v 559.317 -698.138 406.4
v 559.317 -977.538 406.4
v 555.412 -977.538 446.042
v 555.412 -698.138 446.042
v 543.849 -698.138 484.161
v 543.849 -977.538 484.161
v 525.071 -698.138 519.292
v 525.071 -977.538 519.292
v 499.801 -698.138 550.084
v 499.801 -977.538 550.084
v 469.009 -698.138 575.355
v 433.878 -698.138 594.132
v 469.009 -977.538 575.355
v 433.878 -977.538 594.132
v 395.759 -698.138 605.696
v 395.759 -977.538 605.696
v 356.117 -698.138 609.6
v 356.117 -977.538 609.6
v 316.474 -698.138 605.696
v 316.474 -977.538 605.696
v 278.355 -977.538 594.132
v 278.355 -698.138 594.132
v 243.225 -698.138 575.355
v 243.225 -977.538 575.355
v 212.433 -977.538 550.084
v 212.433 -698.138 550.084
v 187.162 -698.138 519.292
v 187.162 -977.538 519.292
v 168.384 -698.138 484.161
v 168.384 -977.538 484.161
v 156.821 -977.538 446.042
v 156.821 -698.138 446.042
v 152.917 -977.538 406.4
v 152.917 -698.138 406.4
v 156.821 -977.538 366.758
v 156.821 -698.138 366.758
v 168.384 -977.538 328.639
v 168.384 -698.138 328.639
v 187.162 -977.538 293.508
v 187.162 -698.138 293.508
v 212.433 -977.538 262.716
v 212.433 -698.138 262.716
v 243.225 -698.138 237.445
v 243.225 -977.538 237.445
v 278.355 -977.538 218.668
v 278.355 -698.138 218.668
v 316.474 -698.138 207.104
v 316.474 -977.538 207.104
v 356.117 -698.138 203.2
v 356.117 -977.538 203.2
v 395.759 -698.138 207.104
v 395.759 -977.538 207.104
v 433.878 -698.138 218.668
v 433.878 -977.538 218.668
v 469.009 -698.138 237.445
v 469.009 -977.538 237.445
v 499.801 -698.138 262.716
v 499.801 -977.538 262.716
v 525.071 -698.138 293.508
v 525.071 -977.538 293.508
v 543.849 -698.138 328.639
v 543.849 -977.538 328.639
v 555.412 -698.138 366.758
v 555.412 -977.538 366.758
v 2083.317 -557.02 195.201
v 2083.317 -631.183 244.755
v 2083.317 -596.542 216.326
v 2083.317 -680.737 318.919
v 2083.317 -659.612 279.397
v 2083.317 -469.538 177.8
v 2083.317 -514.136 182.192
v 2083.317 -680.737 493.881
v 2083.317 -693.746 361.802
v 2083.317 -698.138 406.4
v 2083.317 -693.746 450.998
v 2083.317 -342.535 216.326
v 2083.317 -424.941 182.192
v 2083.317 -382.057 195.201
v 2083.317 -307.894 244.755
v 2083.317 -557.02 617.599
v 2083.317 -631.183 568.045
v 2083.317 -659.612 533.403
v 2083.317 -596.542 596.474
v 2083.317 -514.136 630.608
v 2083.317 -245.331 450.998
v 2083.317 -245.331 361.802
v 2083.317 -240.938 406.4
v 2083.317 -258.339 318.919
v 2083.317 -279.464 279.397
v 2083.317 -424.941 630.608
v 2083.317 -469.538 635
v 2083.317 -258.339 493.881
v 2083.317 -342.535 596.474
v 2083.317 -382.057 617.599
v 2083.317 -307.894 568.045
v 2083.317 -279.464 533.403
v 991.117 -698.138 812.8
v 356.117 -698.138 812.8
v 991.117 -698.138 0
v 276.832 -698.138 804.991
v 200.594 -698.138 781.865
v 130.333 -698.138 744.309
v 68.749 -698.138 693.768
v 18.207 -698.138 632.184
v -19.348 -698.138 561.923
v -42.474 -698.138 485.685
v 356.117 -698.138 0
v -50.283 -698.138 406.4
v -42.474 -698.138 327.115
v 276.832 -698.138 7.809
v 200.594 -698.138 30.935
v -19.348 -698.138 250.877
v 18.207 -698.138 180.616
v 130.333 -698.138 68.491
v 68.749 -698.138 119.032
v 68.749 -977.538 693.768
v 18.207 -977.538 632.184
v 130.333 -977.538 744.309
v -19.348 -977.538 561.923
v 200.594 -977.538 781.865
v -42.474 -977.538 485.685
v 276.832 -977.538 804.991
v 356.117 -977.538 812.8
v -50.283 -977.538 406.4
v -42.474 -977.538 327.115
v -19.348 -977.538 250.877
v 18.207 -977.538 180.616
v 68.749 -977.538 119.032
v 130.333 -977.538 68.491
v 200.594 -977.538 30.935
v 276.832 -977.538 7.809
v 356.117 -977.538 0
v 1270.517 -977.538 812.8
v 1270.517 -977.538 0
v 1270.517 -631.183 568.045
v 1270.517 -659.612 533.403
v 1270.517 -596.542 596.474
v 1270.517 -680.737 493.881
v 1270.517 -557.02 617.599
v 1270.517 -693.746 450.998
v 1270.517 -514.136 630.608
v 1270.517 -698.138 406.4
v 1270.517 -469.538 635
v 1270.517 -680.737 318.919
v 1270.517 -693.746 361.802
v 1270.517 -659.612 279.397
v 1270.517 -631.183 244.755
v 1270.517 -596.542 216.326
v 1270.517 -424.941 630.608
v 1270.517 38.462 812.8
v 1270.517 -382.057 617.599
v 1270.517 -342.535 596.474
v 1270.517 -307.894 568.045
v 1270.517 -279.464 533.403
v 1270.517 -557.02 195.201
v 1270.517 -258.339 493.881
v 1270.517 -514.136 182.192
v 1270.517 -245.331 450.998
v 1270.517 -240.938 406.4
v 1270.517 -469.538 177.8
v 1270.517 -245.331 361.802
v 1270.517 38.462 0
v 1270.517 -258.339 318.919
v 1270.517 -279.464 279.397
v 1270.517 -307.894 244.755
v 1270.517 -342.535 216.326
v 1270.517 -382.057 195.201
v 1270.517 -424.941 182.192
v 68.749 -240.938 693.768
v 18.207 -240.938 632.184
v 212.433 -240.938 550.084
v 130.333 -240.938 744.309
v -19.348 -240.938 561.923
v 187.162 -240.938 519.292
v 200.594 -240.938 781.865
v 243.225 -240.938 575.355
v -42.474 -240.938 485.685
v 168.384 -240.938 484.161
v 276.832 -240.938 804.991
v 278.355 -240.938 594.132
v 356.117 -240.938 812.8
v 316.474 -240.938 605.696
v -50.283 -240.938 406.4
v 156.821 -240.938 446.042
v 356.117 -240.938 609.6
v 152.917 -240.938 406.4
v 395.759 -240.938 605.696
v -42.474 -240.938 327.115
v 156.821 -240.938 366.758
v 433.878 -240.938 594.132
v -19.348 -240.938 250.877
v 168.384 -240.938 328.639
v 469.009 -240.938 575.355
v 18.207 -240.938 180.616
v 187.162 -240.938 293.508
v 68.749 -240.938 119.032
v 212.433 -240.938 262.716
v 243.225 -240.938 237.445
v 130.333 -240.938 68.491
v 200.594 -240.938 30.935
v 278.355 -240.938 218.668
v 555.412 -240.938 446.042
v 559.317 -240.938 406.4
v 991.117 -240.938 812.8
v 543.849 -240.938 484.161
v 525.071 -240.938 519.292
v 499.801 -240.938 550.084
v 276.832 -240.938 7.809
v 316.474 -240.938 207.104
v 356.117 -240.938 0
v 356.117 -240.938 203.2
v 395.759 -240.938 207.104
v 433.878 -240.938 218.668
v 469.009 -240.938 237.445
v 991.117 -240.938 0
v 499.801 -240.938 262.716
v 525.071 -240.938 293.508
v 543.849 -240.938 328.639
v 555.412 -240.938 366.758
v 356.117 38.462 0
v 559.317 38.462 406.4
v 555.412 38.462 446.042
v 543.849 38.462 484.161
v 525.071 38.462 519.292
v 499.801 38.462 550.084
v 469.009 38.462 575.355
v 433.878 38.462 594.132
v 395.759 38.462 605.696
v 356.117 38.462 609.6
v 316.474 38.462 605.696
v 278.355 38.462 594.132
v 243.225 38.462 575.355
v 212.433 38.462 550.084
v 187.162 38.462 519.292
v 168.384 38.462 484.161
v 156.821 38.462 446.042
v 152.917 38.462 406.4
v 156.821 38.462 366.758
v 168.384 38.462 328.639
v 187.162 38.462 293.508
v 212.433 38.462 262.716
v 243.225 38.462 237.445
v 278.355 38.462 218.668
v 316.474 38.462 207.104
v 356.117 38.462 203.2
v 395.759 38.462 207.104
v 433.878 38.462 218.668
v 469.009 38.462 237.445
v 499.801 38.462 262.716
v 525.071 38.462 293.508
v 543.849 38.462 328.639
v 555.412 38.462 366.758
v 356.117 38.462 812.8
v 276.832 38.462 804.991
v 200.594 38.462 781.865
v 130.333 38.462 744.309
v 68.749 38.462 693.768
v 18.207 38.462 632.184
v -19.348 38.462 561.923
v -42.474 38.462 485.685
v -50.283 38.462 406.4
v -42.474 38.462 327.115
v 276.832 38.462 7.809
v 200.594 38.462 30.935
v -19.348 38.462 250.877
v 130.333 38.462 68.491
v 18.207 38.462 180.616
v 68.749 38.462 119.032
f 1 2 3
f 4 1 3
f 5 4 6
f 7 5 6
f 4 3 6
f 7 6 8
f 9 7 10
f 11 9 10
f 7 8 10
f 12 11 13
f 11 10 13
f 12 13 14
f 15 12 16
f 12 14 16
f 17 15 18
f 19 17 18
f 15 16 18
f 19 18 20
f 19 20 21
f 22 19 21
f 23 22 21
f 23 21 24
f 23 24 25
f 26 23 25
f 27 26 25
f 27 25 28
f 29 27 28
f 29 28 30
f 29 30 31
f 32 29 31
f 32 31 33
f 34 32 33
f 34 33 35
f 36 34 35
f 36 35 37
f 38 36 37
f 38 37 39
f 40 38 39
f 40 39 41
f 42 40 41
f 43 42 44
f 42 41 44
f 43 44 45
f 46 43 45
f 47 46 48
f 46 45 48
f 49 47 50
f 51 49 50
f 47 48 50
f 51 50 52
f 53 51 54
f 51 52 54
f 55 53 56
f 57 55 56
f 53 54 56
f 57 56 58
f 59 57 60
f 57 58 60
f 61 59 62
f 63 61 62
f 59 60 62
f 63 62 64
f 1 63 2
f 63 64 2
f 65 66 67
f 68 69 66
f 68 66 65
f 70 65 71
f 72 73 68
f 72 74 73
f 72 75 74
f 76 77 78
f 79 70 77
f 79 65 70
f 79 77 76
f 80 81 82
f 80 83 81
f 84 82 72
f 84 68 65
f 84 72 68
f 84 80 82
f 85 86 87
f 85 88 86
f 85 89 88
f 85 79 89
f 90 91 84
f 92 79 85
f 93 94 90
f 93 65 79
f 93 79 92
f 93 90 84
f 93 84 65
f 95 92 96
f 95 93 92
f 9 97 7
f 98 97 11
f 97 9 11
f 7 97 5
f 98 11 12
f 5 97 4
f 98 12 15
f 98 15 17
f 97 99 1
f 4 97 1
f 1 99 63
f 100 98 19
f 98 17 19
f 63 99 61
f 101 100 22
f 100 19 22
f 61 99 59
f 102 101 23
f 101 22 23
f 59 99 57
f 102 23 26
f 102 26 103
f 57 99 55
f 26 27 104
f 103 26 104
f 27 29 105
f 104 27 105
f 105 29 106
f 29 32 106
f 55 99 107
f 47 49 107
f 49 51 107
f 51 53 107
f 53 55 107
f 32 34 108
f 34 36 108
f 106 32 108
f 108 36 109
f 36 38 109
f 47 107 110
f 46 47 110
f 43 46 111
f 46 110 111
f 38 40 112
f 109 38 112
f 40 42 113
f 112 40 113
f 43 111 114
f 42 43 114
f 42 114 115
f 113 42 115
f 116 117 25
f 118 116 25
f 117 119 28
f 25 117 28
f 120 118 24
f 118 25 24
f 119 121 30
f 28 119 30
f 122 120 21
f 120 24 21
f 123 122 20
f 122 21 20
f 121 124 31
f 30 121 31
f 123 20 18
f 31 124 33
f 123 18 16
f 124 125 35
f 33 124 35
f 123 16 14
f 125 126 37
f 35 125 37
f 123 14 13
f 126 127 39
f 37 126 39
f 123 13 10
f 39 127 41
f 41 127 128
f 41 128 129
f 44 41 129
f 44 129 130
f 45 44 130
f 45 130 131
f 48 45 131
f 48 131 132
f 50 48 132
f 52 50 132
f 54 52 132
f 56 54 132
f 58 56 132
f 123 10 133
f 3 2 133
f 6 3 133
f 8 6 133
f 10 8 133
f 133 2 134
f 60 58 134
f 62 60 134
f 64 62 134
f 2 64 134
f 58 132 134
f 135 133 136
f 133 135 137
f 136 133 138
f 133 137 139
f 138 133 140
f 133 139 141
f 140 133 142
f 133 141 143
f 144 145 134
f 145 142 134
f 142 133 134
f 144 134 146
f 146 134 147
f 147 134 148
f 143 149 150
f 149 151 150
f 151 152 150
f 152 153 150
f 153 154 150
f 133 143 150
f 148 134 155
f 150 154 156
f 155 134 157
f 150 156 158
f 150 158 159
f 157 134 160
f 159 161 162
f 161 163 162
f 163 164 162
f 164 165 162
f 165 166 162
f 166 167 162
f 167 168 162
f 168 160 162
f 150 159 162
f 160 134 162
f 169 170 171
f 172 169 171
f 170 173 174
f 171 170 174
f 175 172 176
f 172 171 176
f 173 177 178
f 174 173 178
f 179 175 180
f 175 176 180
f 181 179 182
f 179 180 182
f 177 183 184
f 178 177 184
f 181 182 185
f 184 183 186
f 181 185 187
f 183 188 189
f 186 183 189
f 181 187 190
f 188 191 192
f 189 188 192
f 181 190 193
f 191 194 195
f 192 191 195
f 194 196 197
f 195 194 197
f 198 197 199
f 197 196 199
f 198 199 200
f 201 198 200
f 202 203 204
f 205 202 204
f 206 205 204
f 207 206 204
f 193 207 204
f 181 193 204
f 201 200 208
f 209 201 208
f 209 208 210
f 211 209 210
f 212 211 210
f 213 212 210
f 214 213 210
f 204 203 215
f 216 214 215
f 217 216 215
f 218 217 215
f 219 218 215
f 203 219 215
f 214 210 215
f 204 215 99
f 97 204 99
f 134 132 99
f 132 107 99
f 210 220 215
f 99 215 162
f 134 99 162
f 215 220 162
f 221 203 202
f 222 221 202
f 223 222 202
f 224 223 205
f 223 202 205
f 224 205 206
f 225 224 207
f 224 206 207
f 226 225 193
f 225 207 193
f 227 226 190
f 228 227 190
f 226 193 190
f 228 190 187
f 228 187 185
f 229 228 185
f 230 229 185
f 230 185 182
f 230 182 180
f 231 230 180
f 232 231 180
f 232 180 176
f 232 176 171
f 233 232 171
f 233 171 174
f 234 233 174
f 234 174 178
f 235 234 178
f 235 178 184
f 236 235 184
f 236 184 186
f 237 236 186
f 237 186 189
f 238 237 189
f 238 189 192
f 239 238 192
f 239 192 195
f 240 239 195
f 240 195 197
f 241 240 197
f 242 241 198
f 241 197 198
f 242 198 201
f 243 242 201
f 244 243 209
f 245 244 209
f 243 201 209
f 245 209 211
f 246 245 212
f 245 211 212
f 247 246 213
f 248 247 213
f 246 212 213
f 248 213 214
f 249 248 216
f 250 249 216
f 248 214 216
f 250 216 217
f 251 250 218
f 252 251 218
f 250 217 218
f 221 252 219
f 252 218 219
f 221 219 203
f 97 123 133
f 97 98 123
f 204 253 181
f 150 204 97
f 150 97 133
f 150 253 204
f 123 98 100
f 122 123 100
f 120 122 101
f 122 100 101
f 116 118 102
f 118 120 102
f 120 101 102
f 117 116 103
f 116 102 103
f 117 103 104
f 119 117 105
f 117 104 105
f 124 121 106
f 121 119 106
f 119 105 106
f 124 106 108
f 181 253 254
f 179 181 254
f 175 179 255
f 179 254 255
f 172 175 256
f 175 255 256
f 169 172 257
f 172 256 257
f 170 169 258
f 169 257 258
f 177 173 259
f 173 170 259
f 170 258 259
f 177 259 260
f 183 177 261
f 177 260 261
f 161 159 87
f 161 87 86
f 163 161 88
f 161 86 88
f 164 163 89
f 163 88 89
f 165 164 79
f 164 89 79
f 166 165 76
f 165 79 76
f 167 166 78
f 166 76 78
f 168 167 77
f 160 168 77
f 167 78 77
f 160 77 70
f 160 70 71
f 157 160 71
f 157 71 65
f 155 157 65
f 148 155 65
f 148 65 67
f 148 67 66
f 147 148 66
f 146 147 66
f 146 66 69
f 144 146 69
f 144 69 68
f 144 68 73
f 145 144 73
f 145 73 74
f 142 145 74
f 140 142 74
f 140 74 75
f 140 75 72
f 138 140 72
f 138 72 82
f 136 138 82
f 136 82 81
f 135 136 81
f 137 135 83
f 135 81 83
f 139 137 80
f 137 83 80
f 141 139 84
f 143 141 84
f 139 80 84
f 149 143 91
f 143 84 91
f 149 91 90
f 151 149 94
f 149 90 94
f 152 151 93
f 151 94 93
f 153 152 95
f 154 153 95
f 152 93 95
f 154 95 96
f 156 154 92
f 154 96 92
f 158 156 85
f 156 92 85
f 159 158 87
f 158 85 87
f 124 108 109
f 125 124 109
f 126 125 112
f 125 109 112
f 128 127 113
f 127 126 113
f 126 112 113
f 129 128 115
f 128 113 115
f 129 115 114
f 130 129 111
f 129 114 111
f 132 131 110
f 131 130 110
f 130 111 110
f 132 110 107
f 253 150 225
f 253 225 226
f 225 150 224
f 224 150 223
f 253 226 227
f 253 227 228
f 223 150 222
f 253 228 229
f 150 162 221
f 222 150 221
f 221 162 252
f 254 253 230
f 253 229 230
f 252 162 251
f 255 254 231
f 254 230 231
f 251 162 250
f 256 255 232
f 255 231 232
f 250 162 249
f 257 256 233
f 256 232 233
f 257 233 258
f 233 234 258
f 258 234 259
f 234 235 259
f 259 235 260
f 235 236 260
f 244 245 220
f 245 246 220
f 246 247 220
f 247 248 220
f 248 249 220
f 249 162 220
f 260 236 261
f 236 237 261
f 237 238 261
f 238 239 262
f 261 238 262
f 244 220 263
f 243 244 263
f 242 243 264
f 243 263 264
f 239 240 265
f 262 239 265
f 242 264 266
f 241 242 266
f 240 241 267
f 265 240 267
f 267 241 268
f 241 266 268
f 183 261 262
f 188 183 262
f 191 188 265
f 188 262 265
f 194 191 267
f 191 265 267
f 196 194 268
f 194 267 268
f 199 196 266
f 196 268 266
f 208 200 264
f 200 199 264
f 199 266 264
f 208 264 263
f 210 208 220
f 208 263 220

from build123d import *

# Parameters (mm, degrees)
F1_DEPTH = 812.8
F3_DEPTH = 1016.001
F4_W     = 812.8
F4_H     = 457.2
F5_DEPTH = 812.8
F7_DEPTH = 812.8
F8_R     = 203.2
F9_DEPTH = 1016.001


with BuildPart() as f1:
    # F0 (on Top) → F1 (new body)
    with BuildSketch(Plane.XY):
        Polygon((1270.516747, 38.461771), (-50.283253, 38.461771), (-50.283253, -240.938229), (991.116747, -240.938229), (991.116747, -698.138229), (-50.283253, -698.138229), (-50.283253, -977.538229), (1270.516747, -977.538229), align=None)
    extrude(amount=F1_DEPTH)

    # F2 (on face) → F3 (cut, through all)
    with BuildSketch(Plane(origin=(0, 38.461771, 0), x_dir=(-1, 0, 0), z_dir=(0, 1, 0))):
        with BuildLine():
            Line((50.283253, 406.4), (50.283253, 812.8))
            Line((50.283253, 812.8), (-356.116747, 812.8))
            ThreePointArc((-356.116747, 812.8), (-68.748551, 693.768196), (50.283253, 406.4))
        make_face()
        with BuildLine():
            Line((50.283253, 0), (50.283253, 406.4))
            ThreePointArc((50.283253, 406.4), (-68.748551, 119.031804), (-356.116747, 0))
            Line((-356.116747, 0), (50.283253, 0))
        make_face()
    extrude(amount=-F3_DEPTH, mode=Mode.SUBTRACT)

    # F4 (on face) → F5 (join)
    with BuildSketch(Plane.XY.offset(812.8)):
        with Locations((1676.916747, -469.538229)):
            Rectangle(F4_W, F4_H)
    extrude(amount=-F5_DEPTH)

    # F6 (on face) → F7 (cut)
    with BuildSketch(Plane.YZ.offset(2083.316747)):
        with BuildLine():
            ThreePointArc((-698.138229, 406.4), (-469.538229, 635), (-240.938229, 406.4))
            Line((-240.938229, 406.4), (-240.938229, 812.8))
            Line((-240.938229, 812.8), (-698.138229, 812.8))
            Line((-698.138229, 812.8), (-698.138229, 406.4))
        make_face()
        with BuildLine():
            Line((-240.938229, 0), (-240.938229, 406.4))
            ThreePointArc((-240.938229, 406.4), (-469.538229, 177.8), (-698.138229, 406.4))
            Line((-698.138229, 406.4), (-698.138229, 0))
            Line((-698.138229, 0), (-240.938229, 0))
        make_face()
    extrude(amount=-F7_DEPTH, mode=Mode.SUBTRACT)

    # F8 (on face) → F9 (cut, through all)
    with BuildSketch(Plane.XZ.offset(977.538229)):
        with Locations((356.116747, 406.4)):
            Circle(F8_R)
    extrude(amount=-F9_DEPTH, mode=Mode.SUBTRACT)


solid = f1.part
